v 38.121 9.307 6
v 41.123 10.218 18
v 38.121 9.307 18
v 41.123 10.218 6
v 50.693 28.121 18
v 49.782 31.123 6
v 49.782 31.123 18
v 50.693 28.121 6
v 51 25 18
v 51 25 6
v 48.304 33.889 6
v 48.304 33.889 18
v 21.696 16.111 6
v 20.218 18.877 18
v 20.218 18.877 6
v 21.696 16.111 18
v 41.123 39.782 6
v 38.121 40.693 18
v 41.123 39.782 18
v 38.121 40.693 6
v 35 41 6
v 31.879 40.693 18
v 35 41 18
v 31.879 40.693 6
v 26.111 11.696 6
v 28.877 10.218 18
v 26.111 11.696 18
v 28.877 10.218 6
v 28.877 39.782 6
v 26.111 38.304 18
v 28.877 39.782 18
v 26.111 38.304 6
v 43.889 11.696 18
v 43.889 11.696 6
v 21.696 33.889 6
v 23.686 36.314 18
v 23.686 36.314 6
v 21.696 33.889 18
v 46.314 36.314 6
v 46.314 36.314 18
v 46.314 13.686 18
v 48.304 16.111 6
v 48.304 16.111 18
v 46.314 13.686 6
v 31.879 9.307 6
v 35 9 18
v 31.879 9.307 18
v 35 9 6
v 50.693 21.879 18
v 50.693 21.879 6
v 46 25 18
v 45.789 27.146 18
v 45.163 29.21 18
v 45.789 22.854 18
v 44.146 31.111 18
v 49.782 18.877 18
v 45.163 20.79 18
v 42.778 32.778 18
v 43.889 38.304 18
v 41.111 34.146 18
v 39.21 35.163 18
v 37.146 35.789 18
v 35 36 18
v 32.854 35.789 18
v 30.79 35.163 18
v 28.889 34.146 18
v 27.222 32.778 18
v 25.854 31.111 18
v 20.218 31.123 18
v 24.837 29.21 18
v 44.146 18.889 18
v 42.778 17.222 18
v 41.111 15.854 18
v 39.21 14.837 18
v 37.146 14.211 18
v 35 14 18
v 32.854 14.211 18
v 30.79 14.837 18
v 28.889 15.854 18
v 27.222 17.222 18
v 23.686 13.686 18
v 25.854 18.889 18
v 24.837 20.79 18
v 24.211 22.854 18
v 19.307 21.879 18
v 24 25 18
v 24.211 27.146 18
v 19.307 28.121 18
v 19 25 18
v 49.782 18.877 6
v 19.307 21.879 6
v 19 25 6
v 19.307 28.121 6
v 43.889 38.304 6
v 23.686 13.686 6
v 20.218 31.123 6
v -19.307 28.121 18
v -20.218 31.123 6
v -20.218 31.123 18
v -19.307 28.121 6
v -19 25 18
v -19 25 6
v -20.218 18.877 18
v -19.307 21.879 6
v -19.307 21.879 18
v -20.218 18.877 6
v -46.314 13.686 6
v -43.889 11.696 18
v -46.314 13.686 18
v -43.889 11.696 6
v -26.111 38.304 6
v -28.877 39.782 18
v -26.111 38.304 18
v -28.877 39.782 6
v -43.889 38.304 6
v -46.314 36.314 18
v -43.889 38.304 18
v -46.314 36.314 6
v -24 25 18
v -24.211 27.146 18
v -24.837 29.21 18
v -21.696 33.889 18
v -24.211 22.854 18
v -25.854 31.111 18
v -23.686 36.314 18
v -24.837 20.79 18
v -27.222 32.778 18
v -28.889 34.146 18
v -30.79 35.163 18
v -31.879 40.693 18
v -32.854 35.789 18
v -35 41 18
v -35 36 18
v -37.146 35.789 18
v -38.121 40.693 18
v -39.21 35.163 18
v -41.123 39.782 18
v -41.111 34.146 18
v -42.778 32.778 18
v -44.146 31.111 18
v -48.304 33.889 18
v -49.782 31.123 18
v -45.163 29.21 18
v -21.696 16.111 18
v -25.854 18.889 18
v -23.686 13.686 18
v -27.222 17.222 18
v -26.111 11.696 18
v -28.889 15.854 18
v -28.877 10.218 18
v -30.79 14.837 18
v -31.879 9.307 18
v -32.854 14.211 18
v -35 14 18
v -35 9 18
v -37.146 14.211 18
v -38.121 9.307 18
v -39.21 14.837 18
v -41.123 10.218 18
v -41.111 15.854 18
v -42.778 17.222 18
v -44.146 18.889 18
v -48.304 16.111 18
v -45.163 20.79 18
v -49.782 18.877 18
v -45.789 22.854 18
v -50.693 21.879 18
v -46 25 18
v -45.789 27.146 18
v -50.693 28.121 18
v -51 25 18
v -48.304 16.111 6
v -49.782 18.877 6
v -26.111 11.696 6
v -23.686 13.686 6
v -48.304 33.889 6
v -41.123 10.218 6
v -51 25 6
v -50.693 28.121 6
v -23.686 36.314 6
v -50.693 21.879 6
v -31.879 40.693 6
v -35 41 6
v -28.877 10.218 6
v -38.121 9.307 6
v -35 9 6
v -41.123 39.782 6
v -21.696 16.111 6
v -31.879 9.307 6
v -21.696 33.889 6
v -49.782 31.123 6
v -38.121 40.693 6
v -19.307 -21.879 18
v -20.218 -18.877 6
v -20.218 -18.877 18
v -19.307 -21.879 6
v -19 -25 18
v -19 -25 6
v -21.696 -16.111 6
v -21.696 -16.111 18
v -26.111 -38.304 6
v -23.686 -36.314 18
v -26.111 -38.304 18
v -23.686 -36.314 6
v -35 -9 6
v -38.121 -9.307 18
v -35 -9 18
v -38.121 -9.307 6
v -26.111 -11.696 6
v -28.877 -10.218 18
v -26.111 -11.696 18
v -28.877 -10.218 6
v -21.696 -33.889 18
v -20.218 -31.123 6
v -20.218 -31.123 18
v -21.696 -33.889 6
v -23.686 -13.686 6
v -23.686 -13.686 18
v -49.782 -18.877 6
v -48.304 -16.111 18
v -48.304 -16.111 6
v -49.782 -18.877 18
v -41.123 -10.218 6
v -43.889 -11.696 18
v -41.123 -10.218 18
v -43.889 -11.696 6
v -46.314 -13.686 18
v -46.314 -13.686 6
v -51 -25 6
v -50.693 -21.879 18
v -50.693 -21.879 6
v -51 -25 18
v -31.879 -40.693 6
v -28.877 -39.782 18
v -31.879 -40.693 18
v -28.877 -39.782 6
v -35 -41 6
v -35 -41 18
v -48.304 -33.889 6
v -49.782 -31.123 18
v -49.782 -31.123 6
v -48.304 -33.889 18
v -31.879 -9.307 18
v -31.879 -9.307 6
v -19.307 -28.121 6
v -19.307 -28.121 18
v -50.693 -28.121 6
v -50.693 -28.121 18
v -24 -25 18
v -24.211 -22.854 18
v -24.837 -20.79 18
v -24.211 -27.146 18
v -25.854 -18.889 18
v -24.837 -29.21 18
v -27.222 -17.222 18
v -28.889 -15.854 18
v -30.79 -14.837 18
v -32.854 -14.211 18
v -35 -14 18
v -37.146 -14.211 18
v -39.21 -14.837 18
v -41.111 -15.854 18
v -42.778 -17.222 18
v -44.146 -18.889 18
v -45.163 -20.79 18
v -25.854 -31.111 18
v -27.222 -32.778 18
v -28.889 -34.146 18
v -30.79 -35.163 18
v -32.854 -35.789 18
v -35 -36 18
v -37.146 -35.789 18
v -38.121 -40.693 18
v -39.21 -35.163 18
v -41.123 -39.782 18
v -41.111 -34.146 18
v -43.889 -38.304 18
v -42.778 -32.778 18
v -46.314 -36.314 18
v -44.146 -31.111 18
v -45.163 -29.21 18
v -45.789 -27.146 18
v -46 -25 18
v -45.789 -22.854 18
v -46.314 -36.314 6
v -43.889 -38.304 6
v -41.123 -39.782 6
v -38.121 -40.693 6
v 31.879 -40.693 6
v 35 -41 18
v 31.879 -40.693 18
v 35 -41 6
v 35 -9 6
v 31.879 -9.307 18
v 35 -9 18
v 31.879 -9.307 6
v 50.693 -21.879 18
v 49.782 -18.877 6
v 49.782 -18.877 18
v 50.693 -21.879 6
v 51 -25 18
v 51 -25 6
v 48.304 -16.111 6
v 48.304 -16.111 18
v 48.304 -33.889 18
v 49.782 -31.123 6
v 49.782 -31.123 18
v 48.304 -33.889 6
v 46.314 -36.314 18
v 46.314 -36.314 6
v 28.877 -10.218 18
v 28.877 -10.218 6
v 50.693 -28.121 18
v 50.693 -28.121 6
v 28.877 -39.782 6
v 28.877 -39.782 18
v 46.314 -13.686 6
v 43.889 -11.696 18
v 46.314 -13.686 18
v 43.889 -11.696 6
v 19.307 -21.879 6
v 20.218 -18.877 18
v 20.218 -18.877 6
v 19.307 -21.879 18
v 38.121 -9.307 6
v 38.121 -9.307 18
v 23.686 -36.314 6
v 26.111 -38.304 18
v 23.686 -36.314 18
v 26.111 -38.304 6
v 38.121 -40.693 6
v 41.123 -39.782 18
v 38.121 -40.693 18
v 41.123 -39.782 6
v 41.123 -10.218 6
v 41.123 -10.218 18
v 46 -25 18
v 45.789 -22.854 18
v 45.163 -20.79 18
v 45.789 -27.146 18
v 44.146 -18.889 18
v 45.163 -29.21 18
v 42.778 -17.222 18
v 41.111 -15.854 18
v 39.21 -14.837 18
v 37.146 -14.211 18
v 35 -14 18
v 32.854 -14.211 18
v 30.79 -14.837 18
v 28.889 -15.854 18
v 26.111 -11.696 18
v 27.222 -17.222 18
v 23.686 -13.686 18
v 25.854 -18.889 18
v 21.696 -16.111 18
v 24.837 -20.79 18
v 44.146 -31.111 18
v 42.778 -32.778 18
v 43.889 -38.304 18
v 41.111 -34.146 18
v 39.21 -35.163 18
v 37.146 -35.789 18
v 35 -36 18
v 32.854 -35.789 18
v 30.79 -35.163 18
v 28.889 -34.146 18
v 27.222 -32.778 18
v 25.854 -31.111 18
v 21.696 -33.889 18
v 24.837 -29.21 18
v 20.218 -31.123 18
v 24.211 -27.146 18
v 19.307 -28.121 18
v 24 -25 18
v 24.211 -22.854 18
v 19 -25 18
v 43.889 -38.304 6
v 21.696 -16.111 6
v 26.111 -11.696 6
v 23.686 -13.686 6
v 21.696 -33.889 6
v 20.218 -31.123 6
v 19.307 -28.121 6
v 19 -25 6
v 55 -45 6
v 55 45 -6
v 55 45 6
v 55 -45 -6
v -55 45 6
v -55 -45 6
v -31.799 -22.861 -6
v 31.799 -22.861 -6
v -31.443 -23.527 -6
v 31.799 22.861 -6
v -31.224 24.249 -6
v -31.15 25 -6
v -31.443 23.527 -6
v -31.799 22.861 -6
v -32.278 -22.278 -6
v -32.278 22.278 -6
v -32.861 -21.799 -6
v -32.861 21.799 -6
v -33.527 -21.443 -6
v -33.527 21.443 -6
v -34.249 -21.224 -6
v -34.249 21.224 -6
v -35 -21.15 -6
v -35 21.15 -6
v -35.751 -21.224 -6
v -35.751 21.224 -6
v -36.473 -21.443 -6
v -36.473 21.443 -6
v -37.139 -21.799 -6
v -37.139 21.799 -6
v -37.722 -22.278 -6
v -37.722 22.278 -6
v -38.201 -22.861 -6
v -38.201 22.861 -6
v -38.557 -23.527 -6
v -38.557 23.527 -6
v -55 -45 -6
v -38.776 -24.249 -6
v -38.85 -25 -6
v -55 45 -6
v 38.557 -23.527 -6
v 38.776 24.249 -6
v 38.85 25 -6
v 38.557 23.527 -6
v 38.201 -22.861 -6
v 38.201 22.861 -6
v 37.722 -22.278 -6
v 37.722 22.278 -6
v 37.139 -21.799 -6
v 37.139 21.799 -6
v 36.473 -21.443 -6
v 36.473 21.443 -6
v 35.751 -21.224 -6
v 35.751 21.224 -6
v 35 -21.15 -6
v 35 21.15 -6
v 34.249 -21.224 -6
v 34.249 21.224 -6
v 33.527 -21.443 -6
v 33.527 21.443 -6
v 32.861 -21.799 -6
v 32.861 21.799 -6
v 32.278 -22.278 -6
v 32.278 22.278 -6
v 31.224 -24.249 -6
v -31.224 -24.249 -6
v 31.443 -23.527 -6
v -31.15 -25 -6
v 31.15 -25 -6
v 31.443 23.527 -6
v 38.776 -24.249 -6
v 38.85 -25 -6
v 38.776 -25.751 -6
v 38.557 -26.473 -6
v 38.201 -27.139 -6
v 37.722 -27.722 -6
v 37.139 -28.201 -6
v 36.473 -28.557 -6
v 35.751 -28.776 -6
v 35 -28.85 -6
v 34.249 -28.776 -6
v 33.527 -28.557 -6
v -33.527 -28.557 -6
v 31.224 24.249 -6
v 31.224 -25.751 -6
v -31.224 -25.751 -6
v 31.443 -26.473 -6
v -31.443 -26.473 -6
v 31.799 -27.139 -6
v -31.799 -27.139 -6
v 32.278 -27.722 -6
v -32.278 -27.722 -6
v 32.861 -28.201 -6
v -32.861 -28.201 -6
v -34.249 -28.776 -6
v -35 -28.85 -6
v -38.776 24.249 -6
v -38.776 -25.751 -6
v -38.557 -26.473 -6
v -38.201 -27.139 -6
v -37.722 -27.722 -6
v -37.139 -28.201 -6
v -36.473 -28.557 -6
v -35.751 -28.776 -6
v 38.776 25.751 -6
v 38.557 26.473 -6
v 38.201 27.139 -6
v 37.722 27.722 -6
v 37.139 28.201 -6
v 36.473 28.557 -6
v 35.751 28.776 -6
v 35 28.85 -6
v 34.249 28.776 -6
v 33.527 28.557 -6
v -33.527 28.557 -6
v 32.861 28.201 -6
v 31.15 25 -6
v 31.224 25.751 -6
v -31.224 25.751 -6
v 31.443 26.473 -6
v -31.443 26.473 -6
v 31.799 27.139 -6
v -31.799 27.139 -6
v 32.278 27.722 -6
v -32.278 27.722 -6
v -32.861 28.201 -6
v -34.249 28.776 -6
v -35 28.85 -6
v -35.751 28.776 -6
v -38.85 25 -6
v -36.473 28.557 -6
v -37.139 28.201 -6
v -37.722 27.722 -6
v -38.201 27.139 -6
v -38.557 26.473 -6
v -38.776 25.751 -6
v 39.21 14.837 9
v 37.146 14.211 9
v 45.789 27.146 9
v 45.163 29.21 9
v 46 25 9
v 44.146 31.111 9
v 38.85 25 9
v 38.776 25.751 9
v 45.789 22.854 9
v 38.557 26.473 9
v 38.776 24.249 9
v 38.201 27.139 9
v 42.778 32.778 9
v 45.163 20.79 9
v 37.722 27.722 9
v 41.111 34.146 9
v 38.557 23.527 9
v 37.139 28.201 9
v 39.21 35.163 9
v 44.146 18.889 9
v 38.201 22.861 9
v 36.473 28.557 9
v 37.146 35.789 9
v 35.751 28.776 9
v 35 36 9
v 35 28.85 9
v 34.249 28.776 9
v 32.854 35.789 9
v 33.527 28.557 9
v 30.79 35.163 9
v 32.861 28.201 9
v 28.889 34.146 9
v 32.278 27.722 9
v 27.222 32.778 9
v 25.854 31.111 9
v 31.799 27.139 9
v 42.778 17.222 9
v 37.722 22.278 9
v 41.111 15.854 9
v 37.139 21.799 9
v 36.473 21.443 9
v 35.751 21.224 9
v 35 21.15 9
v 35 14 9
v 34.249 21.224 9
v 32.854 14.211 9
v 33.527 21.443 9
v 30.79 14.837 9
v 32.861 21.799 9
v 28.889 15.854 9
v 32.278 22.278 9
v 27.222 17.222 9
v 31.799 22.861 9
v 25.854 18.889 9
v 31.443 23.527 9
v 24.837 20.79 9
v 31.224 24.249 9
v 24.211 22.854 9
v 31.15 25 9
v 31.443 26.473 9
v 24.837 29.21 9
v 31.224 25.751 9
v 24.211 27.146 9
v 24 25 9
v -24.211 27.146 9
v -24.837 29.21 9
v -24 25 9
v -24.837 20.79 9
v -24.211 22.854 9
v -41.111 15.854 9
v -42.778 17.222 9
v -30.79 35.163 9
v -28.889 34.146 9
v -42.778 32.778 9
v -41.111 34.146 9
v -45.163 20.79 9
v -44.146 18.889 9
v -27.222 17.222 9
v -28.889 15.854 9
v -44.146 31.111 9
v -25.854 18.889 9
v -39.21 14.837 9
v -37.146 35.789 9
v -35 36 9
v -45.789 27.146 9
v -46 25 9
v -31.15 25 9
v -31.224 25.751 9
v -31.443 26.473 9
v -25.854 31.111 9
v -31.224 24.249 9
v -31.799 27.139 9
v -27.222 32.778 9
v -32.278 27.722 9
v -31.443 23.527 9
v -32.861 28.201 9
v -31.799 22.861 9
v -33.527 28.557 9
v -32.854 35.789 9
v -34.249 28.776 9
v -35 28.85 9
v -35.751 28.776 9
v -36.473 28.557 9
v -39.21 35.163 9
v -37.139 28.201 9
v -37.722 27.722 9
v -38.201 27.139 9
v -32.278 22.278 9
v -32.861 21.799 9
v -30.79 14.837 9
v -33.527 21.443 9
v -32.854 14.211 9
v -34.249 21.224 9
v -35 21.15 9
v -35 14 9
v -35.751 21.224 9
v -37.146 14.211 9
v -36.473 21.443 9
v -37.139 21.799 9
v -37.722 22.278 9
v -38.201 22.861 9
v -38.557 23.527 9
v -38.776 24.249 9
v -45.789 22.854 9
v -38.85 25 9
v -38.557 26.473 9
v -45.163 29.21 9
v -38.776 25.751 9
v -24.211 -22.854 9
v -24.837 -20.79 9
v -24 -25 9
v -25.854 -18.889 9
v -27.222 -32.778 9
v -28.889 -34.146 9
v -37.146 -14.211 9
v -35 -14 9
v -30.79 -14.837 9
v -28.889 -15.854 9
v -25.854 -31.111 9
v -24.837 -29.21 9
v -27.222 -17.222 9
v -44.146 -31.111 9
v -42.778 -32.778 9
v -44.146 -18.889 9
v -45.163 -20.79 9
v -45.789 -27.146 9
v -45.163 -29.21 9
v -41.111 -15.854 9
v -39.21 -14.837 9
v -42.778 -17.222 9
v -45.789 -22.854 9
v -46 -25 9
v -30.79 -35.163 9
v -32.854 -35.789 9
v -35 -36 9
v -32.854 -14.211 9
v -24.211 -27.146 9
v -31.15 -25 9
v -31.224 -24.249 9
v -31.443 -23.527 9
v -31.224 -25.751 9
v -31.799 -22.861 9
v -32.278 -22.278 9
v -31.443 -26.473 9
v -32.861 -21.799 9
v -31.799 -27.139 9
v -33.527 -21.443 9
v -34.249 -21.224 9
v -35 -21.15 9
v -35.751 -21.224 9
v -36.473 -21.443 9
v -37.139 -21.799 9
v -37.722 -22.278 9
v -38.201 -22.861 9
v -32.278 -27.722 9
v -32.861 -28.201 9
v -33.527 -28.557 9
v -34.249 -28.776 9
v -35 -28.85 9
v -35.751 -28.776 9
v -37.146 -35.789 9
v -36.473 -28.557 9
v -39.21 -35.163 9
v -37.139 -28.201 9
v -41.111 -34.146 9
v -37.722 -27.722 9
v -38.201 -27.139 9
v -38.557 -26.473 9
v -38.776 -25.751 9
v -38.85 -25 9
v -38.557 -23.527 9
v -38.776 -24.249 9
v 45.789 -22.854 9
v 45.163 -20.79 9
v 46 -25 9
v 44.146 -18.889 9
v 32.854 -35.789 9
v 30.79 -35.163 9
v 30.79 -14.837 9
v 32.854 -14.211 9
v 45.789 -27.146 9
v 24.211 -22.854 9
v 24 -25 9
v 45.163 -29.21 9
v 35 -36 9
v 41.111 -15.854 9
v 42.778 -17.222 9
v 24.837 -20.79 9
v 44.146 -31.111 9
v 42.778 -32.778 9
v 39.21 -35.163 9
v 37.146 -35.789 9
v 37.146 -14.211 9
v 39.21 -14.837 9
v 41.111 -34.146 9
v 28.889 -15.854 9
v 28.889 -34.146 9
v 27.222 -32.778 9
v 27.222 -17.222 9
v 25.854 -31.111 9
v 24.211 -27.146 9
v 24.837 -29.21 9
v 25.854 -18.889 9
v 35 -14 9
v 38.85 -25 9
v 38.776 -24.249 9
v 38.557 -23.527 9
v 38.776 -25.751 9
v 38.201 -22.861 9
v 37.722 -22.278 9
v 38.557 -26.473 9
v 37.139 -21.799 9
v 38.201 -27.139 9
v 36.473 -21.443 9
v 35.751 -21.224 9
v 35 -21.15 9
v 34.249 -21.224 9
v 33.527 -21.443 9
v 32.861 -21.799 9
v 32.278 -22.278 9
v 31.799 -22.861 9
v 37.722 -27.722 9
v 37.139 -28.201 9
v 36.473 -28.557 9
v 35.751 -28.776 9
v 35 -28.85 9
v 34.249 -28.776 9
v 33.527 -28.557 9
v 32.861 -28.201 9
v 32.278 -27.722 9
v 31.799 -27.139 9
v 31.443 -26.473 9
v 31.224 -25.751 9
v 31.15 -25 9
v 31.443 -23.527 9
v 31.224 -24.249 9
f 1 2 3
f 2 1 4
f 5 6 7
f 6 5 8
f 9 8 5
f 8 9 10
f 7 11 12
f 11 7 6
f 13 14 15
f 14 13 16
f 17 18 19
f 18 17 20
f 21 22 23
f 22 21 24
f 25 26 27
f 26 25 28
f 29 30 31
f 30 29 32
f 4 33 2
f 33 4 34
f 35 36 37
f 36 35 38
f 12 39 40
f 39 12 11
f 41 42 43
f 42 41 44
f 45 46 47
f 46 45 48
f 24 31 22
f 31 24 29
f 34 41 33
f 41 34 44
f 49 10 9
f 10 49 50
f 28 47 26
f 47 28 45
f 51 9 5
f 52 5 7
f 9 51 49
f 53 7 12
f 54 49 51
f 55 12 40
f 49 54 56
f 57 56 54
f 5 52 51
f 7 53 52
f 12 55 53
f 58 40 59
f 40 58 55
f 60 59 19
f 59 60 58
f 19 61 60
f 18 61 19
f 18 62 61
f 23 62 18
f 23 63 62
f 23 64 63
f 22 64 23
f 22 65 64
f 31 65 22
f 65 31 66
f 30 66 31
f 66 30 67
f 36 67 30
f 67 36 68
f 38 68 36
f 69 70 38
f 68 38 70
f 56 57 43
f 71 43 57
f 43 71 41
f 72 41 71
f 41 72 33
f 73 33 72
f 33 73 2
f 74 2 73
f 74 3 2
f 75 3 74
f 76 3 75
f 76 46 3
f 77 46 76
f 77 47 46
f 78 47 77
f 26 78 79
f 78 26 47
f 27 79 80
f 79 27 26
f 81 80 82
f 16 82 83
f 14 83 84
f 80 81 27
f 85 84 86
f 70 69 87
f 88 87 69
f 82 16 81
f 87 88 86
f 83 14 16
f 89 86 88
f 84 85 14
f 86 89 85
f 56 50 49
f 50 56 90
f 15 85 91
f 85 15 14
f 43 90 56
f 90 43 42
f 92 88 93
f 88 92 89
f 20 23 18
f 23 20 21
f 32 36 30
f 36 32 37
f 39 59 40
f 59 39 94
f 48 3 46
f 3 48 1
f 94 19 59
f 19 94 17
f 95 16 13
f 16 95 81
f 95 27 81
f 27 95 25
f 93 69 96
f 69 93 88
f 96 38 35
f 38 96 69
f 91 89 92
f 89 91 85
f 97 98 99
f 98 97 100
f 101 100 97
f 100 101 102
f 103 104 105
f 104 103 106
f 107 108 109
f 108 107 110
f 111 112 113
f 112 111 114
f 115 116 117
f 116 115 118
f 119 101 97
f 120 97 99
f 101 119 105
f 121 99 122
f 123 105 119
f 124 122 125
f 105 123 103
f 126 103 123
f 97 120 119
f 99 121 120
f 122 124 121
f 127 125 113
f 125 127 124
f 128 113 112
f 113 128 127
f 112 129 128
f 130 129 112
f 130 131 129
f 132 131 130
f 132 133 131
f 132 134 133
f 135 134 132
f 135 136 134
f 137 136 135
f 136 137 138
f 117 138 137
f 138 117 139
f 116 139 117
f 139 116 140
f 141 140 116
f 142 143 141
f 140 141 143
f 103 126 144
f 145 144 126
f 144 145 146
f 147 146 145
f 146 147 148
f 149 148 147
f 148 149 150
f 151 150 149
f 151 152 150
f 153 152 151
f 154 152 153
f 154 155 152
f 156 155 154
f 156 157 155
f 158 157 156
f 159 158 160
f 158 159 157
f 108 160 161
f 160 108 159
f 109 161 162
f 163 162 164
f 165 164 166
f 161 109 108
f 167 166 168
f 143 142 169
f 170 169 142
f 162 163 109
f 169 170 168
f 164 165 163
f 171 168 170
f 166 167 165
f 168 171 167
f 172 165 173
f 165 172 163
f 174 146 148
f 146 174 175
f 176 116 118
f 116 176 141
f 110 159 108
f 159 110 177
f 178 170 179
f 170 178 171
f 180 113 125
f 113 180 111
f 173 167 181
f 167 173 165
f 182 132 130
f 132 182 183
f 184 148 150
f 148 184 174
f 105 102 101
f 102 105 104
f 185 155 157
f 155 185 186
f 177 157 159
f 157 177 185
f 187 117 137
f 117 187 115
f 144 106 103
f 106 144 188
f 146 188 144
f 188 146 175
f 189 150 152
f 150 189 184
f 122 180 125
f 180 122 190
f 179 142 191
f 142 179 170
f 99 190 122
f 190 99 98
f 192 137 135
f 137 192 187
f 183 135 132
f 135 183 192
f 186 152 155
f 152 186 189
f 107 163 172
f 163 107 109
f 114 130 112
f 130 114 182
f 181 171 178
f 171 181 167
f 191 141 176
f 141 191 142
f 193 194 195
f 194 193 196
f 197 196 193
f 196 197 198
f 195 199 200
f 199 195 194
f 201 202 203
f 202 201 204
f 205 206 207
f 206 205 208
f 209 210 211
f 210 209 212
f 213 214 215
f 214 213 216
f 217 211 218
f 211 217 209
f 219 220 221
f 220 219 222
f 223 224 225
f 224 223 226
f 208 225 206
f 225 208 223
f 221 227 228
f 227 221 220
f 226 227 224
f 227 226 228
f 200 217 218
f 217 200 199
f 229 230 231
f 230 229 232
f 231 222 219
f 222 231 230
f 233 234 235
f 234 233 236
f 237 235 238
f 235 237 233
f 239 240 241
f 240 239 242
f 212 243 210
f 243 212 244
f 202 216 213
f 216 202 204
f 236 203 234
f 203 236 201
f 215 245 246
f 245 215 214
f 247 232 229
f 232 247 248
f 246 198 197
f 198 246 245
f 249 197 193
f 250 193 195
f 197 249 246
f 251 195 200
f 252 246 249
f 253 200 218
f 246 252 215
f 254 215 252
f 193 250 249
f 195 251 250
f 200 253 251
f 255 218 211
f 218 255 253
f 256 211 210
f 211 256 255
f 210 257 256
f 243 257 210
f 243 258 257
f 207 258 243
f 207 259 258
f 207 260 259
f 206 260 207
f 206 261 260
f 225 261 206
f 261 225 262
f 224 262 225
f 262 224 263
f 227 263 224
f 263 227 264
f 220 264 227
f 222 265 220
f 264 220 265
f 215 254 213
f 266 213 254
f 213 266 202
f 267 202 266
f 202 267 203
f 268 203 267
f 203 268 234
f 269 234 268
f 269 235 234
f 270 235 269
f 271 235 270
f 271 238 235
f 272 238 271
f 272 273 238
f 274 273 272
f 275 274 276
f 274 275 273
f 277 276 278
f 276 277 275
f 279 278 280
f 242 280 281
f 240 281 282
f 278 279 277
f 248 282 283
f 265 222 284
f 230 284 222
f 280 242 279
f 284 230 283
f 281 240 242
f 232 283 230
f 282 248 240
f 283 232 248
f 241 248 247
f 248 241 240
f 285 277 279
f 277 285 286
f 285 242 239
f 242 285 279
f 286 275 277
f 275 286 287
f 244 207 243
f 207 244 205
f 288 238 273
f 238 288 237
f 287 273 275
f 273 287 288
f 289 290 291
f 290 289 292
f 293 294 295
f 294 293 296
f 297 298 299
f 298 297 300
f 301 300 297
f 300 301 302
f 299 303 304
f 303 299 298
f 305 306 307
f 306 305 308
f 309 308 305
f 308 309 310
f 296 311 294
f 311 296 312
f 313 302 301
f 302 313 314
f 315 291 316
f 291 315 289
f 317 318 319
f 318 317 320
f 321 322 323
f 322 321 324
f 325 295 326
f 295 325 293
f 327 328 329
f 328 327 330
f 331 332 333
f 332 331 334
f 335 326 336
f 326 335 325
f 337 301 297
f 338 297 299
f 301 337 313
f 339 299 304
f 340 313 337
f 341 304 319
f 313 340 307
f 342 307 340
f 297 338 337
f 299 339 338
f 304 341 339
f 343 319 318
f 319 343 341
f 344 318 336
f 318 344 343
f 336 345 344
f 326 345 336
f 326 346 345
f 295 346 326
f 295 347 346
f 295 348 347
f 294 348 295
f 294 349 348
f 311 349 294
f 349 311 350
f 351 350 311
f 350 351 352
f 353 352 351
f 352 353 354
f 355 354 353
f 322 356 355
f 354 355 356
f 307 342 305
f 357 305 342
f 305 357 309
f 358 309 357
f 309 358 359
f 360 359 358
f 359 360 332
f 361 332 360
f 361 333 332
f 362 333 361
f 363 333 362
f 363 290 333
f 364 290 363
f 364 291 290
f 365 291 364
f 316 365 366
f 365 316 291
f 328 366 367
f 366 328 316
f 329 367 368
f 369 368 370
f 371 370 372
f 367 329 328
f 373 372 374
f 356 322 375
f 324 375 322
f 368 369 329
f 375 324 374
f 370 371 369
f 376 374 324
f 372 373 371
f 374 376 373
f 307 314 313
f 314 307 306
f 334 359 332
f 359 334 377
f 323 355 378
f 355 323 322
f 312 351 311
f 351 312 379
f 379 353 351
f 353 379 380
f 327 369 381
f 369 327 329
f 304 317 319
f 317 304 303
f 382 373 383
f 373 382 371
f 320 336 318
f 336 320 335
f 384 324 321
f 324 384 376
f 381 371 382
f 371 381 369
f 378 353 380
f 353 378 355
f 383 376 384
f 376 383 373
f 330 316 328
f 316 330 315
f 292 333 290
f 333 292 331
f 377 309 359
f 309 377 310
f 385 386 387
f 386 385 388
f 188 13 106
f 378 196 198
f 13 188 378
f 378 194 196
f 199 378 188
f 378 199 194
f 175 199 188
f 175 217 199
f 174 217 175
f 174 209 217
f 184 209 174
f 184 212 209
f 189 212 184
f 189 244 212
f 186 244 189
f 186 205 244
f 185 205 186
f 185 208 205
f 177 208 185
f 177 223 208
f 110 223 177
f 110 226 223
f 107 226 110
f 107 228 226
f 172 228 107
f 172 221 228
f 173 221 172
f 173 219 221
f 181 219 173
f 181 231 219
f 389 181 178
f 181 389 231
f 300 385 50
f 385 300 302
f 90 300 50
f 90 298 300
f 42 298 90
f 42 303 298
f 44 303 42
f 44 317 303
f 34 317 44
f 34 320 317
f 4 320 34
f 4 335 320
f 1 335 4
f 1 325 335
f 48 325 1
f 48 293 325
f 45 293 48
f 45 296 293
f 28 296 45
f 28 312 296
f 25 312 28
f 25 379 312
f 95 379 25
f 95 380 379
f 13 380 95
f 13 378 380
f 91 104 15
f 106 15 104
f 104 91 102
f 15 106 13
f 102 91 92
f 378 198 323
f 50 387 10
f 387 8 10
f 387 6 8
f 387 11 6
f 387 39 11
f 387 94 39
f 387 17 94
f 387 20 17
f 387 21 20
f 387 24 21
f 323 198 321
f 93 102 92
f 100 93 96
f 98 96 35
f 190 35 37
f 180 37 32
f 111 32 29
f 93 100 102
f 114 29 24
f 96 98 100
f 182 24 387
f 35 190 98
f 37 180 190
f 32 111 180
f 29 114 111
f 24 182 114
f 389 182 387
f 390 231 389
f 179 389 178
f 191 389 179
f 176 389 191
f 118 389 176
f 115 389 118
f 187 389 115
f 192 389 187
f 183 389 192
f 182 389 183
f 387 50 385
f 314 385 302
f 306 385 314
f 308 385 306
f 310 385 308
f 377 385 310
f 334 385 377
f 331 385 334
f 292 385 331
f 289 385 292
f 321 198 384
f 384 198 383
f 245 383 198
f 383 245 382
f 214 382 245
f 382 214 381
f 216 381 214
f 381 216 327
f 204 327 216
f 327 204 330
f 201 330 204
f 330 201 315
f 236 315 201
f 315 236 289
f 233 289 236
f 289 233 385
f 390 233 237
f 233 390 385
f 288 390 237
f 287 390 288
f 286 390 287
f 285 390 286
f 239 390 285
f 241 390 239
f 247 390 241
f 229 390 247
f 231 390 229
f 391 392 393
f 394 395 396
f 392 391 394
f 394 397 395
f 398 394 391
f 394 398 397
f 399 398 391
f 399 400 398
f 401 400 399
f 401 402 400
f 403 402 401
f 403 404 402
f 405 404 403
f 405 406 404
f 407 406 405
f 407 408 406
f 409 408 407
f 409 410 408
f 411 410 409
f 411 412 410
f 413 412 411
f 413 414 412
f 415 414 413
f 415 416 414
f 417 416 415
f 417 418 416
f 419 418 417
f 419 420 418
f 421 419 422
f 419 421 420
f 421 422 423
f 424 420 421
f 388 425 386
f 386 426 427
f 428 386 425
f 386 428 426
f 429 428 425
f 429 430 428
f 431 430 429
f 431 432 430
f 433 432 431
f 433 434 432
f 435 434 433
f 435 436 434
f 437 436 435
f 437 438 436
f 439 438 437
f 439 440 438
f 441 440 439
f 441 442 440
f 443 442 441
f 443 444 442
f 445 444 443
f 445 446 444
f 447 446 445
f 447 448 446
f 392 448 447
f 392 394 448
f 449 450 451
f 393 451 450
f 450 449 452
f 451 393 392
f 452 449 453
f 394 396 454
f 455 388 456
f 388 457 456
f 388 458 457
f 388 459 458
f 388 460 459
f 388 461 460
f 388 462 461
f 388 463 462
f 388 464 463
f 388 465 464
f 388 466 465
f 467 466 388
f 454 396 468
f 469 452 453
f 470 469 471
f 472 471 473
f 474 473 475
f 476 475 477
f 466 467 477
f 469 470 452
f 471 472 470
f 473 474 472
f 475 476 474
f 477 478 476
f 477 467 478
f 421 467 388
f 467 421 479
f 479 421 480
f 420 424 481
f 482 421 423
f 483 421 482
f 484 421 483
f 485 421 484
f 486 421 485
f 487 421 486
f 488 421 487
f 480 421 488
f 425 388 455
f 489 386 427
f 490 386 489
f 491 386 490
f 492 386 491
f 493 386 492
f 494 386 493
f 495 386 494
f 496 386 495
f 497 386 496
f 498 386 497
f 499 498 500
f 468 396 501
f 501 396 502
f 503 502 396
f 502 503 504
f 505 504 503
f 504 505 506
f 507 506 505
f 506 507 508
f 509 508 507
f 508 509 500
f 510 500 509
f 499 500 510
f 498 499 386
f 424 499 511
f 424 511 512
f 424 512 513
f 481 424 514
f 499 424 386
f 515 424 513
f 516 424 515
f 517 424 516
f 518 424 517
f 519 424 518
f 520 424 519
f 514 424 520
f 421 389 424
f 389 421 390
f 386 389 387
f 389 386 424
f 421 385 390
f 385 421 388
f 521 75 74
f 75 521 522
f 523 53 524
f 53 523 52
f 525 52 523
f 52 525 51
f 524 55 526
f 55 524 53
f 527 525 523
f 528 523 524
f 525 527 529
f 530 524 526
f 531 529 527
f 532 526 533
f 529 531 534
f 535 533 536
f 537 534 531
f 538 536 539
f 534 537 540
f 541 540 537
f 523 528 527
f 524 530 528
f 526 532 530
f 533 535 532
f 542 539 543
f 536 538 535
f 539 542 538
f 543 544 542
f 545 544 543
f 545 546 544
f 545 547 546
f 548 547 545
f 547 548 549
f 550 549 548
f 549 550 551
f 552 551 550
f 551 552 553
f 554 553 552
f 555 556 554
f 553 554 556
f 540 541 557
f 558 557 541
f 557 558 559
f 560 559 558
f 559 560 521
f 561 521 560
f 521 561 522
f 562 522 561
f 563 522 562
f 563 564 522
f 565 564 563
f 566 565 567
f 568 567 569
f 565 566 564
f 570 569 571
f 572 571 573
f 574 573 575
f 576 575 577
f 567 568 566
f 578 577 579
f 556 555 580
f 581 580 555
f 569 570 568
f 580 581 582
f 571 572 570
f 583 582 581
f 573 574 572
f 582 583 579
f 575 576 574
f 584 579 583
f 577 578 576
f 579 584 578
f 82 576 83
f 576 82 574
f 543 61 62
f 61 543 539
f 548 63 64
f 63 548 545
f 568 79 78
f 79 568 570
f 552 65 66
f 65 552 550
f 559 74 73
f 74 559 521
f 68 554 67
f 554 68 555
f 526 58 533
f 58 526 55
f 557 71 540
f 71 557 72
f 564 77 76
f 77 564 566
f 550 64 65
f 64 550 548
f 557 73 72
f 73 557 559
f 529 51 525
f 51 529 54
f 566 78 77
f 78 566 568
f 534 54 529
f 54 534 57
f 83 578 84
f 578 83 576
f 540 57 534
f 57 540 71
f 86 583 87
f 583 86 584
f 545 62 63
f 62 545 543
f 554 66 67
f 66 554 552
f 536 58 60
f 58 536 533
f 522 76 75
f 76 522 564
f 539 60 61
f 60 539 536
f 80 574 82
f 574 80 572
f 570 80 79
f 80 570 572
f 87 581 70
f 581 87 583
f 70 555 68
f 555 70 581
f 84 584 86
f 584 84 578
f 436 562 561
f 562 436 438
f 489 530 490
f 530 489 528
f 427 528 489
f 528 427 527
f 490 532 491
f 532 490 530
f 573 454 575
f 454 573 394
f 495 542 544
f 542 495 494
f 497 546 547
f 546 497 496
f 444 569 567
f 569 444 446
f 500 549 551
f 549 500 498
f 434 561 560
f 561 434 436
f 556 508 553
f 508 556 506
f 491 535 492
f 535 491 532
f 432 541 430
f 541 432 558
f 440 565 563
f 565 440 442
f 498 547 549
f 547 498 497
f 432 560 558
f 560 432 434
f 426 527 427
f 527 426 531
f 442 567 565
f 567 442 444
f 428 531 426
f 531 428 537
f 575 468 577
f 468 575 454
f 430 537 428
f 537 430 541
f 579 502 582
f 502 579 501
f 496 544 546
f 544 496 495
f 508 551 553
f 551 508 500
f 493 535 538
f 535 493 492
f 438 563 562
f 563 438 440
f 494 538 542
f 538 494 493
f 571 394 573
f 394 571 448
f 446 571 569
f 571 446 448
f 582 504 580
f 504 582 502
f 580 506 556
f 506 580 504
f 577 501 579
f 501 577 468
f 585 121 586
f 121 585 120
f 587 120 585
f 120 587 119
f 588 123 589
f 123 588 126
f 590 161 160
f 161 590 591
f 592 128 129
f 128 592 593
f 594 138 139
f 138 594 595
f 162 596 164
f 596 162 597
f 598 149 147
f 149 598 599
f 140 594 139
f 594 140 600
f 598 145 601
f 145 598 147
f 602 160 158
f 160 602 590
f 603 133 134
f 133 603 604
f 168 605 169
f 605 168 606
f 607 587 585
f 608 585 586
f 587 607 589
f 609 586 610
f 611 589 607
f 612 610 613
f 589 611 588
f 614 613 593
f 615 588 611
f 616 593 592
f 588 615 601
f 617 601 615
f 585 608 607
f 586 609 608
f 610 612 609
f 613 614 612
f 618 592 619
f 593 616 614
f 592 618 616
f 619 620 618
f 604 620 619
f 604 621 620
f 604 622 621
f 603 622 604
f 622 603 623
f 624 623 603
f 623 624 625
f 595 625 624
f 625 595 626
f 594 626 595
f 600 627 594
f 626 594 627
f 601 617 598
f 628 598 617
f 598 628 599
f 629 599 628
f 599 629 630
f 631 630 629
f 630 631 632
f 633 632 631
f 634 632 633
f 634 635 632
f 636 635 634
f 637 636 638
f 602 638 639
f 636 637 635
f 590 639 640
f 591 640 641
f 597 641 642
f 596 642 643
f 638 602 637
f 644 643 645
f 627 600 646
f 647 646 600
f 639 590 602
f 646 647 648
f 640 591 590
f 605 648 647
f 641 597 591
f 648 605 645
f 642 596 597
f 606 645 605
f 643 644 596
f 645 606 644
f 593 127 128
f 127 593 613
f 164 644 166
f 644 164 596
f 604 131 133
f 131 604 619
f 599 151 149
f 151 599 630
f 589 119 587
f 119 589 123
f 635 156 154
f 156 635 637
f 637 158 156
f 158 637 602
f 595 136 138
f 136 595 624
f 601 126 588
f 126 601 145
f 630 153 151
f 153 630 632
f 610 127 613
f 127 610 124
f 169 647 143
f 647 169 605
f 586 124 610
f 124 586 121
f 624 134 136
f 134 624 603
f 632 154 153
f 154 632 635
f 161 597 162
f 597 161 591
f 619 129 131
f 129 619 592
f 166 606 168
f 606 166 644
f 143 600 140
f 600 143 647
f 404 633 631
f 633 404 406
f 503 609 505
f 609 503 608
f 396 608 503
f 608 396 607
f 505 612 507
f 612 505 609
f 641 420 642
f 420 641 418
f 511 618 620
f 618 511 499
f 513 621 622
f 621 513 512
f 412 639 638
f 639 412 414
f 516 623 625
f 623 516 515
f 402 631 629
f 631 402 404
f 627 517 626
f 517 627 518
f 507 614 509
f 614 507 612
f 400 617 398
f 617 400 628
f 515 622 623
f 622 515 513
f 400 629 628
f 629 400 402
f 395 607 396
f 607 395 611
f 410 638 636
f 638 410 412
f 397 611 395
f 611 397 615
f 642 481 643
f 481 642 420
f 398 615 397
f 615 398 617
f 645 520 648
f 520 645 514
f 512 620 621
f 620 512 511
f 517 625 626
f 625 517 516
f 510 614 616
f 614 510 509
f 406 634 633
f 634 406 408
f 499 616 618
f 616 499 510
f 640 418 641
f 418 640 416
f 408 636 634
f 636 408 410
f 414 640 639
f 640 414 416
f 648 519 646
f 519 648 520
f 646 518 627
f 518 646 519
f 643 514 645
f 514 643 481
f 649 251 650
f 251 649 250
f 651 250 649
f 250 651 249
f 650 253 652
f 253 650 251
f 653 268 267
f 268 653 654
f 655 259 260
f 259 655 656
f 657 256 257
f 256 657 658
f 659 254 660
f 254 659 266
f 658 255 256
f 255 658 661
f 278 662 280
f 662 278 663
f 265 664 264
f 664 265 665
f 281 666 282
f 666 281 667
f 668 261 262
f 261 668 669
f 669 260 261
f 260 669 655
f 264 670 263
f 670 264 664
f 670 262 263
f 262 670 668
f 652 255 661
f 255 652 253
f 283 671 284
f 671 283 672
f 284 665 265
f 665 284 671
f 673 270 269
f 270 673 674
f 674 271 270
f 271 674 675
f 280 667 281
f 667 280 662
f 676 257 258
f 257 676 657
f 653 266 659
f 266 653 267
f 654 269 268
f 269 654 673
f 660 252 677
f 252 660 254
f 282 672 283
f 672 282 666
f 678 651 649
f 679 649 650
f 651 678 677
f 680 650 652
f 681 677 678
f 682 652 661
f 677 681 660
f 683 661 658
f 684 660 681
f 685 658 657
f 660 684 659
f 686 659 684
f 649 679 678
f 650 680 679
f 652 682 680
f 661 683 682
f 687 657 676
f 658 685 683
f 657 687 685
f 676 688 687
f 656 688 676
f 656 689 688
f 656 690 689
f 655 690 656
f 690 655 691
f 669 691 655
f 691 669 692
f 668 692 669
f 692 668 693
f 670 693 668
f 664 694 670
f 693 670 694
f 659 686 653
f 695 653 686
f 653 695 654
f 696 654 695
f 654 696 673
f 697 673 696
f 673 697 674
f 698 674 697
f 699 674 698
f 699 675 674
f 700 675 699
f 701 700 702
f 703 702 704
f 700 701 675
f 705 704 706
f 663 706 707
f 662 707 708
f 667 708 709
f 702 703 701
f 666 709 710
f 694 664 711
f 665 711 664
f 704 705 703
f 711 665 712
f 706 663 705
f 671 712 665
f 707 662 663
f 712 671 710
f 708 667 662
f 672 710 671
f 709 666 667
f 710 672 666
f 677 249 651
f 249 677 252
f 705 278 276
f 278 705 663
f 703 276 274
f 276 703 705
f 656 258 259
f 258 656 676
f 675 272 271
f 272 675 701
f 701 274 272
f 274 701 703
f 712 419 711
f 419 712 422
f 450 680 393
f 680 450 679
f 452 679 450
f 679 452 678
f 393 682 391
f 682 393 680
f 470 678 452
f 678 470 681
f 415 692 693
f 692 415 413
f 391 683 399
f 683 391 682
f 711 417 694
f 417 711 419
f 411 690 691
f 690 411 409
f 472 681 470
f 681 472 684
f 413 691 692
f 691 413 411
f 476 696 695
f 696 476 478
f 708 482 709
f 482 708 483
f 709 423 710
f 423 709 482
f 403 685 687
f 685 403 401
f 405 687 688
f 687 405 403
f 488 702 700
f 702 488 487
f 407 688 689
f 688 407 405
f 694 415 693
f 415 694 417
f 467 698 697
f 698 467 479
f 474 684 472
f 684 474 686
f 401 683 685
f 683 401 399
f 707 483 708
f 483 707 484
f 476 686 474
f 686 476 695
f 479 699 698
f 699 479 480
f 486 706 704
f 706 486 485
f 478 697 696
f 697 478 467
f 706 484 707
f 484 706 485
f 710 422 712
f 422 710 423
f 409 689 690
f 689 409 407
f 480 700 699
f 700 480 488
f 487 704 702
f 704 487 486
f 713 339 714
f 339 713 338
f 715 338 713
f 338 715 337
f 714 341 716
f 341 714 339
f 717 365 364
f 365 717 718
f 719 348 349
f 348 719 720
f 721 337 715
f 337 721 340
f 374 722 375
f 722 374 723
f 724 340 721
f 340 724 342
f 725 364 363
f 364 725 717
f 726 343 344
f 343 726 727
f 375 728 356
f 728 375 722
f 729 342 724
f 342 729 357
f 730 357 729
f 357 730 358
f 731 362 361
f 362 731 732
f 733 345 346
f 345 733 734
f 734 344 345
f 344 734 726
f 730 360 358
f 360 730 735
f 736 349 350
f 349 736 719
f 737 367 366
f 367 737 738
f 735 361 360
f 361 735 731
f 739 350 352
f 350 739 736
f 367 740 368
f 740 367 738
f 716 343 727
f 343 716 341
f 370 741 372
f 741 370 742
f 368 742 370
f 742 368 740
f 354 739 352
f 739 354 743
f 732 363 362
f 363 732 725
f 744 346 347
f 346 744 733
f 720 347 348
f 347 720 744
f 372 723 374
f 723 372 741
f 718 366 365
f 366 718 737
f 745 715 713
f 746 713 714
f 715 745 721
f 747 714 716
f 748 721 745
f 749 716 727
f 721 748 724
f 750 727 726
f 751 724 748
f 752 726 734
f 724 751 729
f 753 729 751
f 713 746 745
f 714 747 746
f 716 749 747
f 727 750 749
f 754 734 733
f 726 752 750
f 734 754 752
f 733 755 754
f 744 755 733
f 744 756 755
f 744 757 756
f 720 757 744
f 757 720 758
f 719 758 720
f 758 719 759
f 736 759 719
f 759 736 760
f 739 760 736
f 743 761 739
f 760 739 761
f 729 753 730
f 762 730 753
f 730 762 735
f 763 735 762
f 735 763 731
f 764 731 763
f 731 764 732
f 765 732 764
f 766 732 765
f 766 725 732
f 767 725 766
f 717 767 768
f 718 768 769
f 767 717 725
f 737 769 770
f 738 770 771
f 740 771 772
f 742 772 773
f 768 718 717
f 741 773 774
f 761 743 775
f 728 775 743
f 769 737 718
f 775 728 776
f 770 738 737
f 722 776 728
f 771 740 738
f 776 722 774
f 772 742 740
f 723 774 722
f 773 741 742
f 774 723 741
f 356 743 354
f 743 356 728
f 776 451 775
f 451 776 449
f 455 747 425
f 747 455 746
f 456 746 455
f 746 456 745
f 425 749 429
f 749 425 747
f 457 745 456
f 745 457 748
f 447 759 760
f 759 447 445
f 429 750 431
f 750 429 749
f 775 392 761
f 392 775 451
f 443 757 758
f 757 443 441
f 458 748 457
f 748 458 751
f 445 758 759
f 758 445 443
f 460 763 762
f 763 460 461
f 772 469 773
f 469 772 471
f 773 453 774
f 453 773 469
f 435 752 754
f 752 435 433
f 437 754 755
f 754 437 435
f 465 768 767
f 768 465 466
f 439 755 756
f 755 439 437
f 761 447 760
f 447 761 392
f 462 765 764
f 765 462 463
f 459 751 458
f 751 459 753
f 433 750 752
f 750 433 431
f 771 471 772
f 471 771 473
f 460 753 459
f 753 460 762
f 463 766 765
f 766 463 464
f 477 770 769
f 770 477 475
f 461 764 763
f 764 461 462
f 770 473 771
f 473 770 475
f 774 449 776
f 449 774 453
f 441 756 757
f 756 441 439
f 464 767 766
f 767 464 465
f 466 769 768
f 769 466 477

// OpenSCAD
$fn = 32;

// ----------------------------------------------------------------------
// Socket pad plate
// bosses with counterbored sockets for the screws
// ----------------------------------------------------------------------

// --- parameters (mm) ---
base_t = 12;            // base plate thickness
boss_h = 12;            // boss height above the base plate
boss_d = 32;            // boss diameter
socket_d = 22;          // socket diameter
socket_depth = 9;       // socket depth from the boss face
bolt_d = 7.7;           // screw clearance hole through the socket floor
plate = [110, 90, 12];  // overall size (x, y, z)
edge = 20;              // boss centre offset from the plate edge
pads = 4;               // boss count, one per corner

// --- derived feature positions (mm) ---
height = base_t + boss_h;        // = 24   overall height of the part
corner_x = plate[0] / 2 - edge;  // = 35   boss centre X
corner_y = plate[1] / 2 - edge;  // = 25   boss centre Y
feature_centers = [
  [corner_x, corner_y],
  [-corner_x, corner_y],
  [-corner_x, -corner_y],
  [corner_x, -corner_y]
];   // boss centres: sockets, holes and the pads themselves are placed from here

// base plate, bosses on feature_centers, socket + through hole in each
difference() {
  union() {
    cube(plate, center = true);
    for (centre = feature_centers)
      translate([centre[0], centre[1], plate[2] / 2 - 1])
        cylinder(d = boss_d, h = boss_h + 1);
  }
  for (centre = feature_centers) {
    translate([centre[0], centre[1], plate[2] / 2 + boss_h - socket_depth])
      cylinder(d = socket_d, h = socket_depth + 1);
    translate([centre[0], centre[1], -height])
      cylinder(d = bolt_d, h = 2 * height + 2);  // through the socket floor
  }
}
